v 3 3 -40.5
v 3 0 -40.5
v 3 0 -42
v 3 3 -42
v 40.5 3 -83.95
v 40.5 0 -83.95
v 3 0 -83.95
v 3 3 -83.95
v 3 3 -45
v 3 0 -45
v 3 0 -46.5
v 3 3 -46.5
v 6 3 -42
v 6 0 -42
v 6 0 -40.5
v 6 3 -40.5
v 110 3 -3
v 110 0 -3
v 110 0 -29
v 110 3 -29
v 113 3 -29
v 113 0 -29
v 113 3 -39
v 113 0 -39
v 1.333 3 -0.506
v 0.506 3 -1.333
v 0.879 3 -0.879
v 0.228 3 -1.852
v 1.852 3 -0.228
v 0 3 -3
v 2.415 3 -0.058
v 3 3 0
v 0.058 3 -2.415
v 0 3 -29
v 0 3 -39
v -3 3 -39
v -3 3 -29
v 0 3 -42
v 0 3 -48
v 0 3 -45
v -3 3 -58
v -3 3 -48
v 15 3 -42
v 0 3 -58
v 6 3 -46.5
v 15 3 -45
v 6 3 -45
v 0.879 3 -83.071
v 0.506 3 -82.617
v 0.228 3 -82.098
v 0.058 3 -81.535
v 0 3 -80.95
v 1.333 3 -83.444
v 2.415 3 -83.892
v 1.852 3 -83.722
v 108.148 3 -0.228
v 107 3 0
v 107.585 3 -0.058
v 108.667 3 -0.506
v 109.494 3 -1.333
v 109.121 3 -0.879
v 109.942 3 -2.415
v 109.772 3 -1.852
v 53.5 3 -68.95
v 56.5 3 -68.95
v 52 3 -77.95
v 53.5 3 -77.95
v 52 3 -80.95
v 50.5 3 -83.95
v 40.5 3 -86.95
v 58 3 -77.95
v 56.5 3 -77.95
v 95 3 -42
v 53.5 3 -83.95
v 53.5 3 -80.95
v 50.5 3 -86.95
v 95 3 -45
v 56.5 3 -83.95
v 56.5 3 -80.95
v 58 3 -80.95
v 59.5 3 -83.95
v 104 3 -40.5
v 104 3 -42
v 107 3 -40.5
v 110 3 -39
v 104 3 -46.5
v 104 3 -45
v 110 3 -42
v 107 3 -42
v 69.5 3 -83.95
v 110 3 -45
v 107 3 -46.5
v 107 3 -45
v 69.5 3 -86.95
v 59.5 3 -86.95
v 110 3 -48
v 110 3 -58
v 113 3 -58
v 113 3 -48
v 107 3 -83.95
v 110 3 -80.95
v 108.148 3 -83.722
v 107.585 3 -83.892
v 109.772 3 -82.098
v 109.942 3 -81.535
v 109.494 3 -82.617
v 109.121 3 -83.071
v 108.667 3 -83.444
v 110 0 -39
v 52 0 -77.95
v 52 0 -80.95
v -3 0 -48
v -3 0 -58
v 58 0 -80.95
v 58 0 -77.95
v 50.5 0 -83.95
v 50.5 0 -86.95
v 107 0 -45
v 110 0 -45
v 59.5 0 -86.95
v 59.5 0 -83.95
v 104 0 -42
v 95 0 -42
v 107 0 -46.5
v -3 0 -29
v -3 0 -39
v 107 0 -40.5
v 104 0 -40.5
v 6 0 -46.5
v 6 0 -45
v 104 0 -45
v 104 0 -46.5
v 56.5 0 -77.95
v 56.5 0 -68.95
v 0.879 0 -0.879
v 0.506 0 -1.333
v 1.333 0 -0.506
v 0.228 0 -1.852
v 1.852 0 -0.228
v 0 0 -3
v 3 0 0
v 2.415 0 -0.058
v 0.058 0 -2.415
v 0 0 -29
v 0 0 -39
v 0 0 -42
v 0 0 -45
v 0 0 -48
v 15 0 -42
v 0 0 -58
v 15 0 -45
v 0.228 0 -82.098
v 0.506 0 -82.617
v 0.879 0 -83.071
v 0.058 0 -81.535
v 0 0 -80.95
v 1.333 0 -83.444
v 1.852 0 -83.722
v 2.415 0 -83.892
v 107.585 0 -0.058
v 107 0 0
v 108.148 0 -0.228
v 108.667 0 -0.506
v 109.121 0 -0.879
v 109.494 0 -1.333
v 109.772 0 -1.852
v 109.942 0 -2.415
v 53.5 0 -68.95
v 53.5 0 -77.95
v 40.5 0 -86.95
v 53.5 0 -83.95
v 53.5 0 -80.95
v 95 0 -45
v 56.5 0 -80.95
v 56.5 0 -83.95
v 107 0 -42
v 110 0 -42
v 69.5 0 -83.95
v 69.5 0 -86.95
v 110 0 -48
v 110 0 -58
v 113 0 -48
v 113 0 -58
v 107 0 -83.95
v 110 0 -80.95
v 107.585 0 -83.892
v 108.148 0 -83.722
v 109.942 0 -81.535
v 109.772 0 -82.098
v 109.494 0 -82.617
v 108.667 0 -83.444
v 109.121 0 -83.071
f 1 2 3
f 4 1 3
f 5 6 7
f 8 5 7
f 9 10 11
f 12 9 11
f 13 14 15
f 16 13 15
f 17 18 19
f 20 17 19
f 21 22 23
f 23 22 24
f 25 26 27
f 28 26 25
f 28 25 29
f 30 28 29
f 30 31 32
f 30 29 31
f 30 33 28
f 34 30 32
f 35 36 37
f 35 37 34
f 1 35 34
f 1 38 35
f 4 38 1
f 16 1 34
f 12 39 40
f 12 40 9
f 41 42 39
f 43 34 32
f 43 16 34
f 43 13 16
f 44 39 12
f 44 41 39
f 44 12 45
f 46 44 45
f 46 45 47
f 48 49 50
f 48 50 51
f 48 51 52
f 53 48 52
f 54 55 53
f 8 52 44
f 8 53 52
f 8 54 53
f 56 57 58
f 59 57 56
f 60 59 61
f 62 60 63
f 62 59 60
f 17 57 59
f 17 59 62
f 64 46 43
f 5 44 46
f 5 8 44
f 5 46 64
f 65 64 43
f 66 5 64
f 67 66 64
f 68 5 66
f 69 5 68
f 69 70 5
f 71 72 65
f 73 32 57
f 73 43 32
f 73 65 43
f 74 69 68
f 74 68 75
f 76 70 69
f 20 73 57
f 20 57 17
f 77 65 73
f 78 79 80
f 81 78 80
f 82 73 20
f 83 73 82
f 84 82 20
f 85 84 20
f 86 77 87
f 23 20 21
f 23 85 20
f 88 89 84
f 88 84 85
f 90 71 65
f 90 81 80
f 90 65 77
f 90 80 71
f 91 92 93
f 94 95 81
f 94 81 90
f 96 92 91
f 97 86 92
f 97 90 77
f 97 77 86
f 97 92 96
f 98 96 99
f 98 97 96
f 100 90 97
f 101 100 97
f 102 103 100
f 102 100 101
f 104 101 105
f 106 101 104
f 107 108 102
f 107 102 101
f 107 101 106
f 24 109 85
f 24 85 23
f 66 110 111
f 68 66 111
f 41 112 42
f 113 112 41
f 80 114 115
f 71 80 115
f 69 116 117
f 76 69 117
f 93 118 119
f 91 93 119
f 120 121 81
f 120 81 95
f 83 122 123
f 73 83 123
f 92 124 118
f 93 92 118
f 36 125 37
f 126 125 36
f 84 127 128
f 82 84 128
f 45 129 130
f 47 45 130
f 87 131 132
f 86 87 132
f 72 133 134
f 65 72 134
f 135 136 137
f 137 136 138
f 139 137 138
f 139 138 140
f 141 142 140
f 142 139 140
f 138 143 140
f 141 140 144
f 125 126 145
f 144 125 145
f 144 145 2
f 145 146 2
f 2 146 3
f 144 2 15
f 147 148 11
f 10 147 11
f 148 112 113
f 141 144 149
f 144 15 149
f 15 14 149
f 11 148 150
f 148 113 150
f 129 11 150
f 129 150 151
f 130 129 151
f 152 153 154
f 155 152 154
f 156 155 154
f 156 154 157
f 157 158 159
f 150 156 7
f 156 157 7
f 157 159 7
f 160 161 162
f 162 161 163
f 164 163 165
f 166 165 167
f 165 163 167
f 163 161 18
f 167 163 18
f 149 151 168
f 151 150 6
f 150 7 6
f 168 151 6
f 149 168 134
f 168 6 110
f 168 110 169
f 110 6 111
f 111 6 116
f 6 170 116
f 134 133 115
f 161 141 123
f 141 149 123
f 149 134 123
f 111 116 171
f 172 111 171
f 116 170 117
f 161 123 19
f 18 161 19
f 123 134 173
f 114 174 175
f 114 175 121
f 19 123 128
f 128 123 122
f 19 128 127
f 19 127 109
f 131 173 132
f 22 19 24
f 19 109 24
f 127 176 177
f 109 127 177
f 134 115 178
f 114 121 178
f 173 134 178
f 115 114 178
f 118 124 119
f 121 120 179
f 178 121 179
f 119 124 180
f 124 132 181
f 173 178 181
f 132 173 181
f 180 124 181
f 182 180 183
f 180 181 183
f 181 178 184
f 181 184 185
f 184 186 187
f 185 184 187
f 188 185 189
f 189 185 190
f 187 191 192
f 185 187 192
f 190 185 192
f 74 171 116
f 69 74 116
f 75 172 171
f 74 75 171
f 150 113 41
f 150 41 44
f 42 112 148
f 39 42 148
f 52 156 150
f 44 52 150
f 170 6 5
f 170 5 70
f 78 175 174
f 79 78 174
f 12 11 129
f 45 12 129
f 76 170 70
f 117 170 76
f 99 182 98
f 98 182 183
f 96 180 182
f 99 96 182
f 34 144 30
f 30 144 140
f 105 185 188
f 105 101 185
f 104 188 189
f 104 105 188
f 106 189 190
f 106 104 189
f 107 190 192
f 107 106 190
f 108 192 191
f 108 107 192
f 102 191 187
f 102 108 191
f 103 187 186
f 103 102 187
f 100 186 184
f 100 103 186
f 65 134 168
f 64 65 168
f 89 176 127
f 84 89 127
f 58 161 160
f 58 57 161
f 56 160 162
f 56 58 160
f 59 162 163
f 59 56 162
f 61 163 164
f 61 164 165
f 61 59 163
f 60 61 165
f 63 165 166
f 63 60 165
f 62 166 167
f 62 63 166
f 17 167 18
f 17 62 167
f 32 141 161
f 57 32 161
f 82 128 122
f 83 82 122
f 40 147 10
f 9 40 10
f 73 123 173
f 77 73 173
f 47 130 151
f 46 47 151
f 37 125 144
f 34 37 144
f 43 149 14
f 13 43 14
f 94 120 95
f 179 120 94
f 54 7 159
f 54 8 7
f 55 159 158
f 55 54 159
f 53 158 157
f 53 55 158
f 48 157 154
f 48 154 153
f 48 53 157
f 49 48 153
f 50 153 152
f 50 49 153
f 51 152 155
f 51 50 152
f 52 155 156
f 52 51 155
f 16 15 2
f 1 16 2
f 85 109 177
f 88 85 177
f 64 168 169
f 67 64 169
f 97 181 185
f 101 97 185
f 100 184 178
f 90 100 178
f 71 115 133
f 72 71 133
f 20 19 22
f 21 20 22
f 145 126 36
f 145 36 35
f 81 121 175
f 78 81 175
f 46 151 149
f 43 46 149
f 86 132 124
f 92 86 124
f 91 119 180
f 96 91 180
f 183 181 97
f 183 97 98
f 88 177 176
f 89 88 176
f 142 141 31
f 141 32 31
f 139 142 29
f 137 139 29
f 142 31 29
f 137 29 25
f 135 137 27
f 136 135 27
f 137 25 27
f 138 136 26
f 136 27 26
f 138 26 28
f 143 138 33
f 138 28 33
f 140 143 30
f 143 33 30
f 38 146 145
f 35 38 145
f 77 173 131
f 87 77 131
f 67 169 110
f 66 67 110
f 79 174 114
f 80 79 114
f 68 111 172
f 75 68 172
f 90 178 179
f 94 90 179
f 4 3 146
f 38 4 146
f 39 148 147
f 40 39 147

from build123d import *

# Parameters (mm, degrees)
SKETCH1_W           = 3
SKETCH1_H           = 10
SKETCH1_W_2         = 10
SKETCH1_H_2         = 3
BOSS_EXTRUDE1_DEPTH = 3
FILLET1_R           = 3


with BuildPart() as part:
    # Sketch1 → Boss-Extrude1 (new body)
    with BuildSketch(Plane(origin=(0, 0, 0), x_dir=(1, 0, 0), z_dir=(0, 1, 0))):
        Polygon((0, 29), (0, 0), (100, 0), (110, 0), (110, 29), (110, 39), (110, 42), (107, 42), (107, 40.5), (104, 40.5), (104, 42), (95, 42), (95, 45), (104, 45), (104, 46.5), (107, 46.5), (107, 45), (110, 45), (110, 48), (110, 58), (110, 83.95), (69.5, 83.95), (59.5, 83.95), (56.5, 83.95), (56.5, 80.95), (58, 80.95), (58, 77.95), (56.5, 77.95), (56.5, 68.95), (53.5, 68.95), (53.5, 77.95), (52, 77.95), (52, 80.95), (53.5, 80.95), (53.5, 83.95), (50.5, 83.95), (40.5, 83.95), (0, 83.95), (0, 58), (0, 48), (0, 45), (3, 45), (3, 46.5), (6, 46.5), (6, 45), (15, 45), (15, 42), (6, 42), (6, 40.5), (3, 40.5), (3, 42), (0, 42), (0, 39), align=None)
        with Locations((-1.5, 53)):
            Rectangle(SKETCH1_W, SKETCH1_H)
        with Locations((-1.5, 34)):
            Rectangle(SKETCH1_W, SKETCH1_H)
        with Locations((45.5, 85.45)):
            Rectangle(SKETCH1_W_2, SKETCH1_H_2)
        with Locations((64.5, 85.45)):
            Rectangle(SKETCH1_W_2, SKETCH1_H_2)
        with Locations((111.5, 53)):
            Rectangle(SKETCH1_W, SKETCH1_H)
        with Locations((111.5, 34)):
            Rectangle(SKETCH1_W, SKETCH1_H)
    extrude(amount=BOSS_EXTRUDE1_DEPTH)

    # Fillet1
    fillet1_edges = [part.edges().sort_by_distance(p)[0] for p in [
        (110, 1.5, -83.95),
        (110, 1.5, 0),
        (0, 1.5, 0),
        (0, 1.5, -83.95),
    ]]
    fillet(fillet1_edges, radius=FILLET1_R)


solid = part.part
